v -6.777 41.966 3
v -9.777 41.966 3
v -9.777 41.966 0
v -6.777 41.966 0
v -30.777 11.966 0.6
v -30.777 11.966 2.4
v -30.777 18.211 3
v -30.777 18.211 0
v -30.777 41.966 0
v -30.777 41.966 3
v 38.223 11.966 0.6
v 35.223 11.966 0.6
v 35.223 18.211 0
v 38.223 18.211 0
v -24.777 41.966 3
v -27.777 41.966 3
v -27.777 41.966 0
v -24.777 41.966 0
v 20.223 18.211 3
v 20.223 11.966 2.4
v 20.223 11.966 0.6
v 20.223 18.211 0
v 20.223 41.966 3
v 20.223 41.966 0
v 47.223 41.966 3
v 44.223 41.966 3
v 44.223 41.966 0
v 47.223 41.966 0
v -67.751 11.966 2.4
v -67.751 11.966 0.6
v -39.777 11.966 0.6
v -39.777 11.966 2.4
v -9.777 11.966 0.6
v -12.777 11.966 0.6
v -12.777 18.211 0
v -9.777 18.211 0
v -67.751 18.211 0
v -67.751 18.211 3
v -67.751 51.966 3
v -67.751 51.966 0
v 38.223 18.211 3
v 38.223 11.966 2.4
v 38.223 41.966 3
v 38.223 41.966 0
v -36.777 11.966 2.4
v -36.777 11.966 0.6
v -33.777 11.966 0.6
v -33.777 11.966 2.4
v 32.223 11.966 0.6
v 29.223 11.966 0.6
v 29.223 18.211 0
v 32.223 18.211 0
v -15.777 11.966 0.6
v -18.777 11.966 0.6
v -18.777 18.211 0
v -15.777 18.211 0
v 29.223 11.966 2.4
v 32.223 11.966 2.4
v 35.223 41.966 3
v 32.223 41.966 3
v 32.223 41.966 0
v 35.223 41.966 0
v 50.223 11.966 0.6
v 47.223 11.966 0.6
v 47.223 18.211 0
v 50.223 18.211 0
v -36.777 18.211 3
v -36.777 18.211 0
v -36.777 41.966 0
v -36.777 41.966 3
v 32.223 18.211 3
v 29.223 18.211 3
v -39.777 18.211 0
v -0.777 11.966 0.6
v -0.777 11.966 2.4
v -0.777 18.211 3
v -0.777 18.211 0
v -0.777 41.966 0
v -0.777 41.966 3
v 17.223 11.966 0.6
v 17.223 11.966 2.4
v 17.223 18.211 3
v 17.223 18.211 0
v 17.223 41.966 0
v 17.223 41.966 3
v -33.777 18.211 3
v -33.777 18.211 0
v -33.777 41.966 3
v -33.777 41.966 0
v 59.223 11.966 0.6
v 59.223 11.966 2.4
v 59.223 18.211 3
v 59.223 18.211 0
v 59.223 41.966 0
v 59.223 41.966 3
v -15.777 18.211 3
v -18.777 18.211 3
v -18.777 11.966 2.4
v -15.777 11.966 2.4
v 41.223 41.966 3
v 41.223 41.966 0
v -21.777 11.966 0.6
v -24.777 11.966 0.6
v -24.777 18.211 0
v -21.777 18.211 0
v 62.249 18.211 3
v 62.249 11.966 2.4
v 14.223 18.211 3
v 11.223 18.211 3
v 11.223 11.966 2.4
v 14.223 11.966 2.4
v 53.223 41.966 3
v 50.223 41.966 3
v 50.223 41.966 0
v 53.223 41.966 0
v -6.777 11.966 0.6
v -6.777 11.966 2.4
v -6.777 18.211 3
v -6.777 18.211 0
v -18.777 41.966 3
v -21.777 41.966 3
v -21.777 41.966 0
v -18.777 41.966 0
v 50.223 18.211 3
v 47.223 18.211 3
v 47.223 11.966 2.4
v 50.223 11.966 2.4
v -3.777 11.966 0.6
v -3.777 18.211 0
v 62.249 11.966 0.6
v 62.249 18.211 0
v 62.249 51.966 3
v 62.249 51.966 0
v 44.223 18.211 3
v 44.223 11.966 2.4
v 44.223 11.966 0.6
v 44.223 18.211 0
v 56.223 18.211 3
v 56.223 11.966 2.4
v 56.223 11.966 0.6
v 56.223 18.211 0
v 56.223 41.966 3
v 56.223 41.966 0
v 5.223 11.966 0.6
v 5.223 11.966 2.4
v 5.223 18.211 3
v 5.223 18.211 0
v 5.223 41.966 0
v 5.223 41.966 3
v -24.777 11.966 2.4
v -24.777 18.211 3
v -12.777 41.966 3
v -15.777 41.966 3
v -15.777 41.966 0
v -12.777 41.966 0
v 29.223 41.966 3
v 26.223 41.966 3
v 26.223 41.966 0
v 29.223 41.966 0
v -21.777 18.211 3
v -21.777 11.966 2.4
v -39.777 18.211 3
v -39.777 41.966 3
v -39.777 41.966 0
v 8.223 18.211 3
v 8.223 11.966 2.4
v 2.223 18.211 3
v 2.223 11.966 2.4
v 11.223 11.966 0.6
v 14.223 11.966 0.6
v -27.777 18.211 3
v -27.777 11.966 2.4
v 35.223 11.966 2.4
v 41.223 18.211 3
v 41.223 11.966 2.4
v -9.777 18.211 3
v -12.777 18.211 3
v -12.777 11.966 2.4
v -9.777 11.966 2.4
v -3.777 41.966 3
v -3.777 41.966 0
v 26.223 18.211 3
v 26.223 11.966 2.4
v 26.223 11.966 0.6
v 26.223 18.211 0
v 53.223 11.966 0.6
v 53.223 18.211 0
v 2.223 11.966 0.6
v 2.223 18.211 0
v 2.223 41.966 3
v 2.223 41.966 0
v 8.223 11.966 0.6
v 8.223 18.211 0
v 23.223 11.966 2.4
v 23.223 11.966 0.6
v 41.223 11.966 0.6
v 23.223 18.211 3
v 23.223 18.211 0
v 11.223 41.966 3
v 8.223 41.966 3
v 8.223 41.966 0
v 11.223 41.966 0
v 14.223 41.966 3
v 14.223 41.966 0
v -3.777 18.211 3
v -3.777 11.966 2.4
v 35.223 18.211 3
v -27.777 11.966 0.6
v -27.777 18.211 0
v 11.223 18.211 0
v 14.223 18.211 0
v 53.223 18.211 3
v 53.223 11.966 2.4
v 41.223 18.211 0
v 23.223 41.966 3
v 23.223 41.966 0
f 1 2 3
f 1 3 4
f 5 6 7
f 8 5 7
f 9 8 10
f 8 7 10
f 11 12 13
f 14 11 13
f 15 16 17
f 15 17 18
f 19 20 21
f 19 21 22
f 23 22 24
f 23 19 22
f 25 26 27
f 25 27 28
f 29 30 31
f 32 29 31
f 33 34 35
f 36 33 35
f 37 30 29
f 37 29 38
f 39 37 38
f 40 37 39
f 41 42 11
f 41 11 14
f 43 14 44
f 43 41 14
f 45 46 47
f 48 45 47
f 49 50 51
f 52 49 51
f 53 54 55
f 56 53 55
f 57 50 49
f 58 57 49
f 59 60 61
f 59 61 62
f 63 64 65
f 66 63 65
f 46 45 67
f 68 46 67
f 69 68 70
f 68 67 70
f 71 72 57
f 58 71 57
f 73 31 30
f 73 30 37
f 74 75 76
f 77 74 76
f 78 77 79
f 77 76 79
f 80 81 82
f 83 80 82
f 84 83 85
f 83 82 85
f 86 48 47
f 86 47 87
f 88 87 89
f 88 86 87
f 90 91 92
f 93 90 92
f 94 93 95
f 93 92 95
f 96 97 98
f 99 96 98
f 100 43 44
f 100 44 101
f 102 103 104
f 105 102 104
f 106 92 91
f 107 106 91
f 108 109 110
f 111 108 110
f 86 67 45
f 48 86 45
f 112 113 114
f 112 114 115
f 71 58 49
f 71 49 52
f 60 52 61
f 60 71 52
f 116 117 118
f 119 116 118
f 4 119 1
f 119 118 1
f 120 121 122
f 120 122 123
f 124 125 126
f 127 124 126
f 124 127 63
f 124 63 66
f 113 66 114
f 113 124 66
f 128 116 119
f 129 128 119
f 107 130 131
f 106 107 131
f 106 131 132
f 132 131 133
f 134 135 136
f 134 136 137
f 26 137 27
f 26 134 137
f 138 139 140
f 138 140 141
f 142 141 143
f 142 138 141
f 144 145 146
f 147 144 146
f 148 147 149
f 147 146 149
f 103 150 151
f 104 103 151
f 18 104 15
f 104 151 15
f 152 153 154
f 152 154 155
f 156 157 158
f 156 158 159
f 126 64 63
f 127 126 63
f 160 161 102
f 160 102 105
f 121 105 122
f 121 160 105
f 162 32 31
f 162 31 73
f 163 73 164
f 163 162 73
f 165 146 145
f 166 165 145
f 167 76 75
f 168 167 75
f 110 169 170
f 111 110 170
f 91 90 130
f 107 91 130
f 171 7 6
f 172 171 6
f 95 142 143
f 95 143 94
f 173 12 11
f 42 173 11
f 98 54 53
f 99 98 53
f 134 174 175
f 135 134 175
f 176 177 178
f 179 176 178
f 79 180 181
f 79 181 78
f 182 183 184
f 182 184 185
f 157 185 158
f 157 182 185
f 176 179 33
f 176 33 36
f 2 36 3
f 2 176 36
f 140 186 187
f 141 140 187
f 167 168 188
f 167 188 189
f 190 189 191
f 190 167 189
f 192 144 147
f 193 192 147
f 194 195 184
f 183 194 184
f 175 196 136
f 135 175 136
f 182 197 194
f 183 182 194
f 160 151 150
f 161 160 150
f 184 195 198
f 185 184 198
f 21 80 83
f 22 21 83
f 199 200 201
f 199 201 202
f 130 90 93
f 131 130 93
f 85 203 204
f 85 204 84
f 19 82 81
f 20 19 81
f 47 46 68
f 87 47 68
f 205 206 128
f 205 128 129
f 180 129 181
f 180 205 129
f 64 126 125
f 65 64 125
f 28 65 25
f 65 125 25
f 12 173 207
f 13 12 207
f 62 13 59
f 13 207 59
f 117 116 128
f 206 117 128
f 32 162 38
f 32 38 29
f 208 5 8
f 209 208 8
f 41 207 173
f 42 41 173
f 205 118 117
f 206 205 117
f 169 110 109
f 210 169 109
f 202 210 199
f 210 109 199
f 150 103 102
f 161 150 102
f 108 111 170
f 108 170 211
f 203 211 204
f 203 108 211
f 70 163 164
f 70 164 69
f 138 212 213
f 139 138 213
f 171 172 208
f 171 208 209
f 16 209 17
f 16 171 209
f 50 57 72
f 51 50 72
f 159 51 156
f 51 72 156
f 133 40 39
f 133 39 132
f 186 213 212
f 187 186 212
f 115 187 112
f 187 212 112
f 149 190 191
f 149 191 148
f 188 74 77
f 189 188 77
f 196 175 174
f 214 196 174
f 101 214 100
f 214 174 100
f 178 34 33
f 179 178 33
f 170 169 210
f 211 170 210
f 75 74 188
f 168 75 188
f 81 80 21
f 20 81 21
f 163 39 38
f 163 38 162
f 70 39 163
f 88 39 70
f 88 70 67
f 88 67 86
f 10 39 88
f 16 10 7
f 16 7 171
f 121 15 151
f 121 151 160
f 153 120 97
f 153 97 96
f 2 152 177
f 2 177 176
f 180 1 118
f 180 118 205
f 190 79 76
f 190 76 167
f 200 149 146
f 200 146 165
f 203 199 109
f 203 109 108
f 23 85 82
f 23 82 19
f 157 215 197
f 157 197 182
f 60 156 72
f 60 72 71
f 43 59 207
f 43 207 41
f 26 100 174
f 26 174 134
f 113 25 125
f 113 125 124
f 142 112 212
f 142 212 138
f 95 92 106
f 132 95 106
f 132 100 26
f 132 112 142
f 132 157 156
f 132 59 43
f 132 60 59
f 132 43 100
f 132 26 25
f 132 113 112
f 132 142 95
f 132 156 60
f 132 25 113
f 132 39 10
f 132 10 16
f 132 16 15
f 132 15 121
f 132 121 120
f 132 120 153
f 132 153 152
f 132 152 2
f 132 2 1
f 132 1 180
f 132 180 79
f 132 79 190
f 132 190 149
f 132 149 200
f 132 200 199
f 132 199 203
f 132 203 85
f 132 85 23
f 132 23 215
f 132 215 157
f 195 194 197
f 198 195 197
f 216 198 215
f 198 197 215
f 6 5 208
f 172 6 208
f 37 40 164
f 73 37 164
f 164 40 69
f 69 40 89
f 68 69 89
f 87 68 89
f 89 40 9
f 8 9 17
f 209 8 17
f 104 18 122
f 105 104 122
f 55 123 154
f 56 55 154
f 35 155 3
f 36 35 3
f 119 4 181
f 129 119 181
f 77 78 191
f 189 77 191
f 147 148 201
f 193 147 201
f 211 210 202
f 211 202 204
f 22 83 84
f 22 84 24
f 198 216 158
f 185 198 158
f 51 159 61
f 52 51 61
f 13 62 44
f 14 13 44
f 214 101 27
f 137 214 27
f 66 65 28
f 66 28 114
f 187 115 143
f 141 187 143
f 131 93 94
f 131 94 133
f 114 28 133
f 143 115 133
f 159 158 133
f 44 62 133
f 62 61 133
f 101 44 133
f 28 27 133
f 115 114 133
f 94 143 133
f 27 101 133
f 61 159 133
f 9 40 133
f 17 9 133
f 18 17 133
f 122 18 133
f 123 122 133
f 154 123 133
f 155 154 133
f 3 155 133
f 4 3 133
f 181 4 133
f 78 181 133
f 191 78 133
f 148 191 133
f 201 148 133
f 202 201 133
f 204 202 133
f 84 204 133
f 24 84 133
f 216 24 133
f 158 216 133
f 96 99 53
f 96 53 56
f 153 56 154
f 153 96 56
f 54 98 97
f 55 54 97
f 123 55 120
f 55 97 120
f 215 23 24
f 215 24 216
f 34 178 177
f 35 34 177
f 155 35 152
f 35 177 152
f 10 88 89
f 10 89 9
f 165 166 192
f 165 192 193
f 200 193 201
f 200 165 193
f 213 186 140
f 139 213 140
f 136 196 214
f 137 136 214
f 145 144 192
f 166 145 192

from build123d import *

# Parameters (mm, degrees)
F0_W     = 130
F0_H     = 40
F1_DEPTH = 3
F2_W     = 3
F2_H     = 30
F3_DEPTH = 25
F5_DEPTH = 130.001


with BuildPart() as f1:
    # F0 (on Top) → F1 (new body)
    with BuildSketch(Plane.XY):
        with Locations((-2.750717, 31.965788)):
            Rectangle(F0_W, F0_H)
    extrude(amount=F1_DEPTH)

    # F2 (on face) → F3 (cut)
    with BuildSketch(Plane.XY.offset(3)):
        with Locations((-38.276677, 26.965788)):
            Rectangle(F2_W, F2_H)
        with Locations((-32.276677, 26.965788)):
            Rectangle(F2_W, F2_H)
        with Locations((-26.276677, 26.965788)):
            Rectangle(F2_W, F2_H)
        with Locations((-20.276677, 26.965788)):
            Rectangle(F2_W, F2_H)
        with Locations((-14.276677, 26.965788)):
            Rectangle(F2_W, F2_H)
        with Locations((-8.276677, 26.965788)):
            Rectangle(F2_W, F2_H)
        with Locations((-2.276677, 26.965788)):
            Rectangle(F2_W, F2_H)
        with Locations((3.723323, 26.965788)):
            Rectangle(F2_W, F2_H)
        with Locations((9.723323, 26.965788)):
            Rectangle(F2_W, F2_H)
        with Locations((15.723323, 26.965788)):
            Rectangle(F2_W, F2_H)
        with Locations((21.723323, 26.965788)):
            Rectangle(F2_W, F2_H)
        with Locations((27.723323, 26.965788)):
            Rectangle(F2_W, F2_H)
        with Locations((33.723323, 26.965788)):
            Rectangle(F2_W, F2_H)
        with Locations((39.723323, 26.965788)):
            Rectangle(F2_W, F2_H)
        with Locations((45.723323, 26.965788)):
            Rectangle(F2_W, F2_H)
        with Locations((51.723323, 26.965788)):
            Rectangle(F2_W, F2_H)
        with Locations((57.723323, 26.965788)):
            Rectangle(F2_W, F2_H)
    extrude(amount=-F3_DEPTH, mode=Mode.SUBTRACT)

    # F4 (on face) → F5 (cut, through all)
    with BuildSketch(Plane(origin=(-67.750717, 0, 0), x_dir=(0, -1, 0), z_dir=(-1, 0, 0))):
        Polygon((-18.210504, 3), (-11.965788, 2.4), (-11.965788, 3), align=None)
        Polygon((-11.965788, 0), (-11.965788, 0.6), (-18.210504, 0), align=None)
    extrude(amount=-F5_DEPTH, mode=Mode.SUBTRACT)


solid = f1.part
